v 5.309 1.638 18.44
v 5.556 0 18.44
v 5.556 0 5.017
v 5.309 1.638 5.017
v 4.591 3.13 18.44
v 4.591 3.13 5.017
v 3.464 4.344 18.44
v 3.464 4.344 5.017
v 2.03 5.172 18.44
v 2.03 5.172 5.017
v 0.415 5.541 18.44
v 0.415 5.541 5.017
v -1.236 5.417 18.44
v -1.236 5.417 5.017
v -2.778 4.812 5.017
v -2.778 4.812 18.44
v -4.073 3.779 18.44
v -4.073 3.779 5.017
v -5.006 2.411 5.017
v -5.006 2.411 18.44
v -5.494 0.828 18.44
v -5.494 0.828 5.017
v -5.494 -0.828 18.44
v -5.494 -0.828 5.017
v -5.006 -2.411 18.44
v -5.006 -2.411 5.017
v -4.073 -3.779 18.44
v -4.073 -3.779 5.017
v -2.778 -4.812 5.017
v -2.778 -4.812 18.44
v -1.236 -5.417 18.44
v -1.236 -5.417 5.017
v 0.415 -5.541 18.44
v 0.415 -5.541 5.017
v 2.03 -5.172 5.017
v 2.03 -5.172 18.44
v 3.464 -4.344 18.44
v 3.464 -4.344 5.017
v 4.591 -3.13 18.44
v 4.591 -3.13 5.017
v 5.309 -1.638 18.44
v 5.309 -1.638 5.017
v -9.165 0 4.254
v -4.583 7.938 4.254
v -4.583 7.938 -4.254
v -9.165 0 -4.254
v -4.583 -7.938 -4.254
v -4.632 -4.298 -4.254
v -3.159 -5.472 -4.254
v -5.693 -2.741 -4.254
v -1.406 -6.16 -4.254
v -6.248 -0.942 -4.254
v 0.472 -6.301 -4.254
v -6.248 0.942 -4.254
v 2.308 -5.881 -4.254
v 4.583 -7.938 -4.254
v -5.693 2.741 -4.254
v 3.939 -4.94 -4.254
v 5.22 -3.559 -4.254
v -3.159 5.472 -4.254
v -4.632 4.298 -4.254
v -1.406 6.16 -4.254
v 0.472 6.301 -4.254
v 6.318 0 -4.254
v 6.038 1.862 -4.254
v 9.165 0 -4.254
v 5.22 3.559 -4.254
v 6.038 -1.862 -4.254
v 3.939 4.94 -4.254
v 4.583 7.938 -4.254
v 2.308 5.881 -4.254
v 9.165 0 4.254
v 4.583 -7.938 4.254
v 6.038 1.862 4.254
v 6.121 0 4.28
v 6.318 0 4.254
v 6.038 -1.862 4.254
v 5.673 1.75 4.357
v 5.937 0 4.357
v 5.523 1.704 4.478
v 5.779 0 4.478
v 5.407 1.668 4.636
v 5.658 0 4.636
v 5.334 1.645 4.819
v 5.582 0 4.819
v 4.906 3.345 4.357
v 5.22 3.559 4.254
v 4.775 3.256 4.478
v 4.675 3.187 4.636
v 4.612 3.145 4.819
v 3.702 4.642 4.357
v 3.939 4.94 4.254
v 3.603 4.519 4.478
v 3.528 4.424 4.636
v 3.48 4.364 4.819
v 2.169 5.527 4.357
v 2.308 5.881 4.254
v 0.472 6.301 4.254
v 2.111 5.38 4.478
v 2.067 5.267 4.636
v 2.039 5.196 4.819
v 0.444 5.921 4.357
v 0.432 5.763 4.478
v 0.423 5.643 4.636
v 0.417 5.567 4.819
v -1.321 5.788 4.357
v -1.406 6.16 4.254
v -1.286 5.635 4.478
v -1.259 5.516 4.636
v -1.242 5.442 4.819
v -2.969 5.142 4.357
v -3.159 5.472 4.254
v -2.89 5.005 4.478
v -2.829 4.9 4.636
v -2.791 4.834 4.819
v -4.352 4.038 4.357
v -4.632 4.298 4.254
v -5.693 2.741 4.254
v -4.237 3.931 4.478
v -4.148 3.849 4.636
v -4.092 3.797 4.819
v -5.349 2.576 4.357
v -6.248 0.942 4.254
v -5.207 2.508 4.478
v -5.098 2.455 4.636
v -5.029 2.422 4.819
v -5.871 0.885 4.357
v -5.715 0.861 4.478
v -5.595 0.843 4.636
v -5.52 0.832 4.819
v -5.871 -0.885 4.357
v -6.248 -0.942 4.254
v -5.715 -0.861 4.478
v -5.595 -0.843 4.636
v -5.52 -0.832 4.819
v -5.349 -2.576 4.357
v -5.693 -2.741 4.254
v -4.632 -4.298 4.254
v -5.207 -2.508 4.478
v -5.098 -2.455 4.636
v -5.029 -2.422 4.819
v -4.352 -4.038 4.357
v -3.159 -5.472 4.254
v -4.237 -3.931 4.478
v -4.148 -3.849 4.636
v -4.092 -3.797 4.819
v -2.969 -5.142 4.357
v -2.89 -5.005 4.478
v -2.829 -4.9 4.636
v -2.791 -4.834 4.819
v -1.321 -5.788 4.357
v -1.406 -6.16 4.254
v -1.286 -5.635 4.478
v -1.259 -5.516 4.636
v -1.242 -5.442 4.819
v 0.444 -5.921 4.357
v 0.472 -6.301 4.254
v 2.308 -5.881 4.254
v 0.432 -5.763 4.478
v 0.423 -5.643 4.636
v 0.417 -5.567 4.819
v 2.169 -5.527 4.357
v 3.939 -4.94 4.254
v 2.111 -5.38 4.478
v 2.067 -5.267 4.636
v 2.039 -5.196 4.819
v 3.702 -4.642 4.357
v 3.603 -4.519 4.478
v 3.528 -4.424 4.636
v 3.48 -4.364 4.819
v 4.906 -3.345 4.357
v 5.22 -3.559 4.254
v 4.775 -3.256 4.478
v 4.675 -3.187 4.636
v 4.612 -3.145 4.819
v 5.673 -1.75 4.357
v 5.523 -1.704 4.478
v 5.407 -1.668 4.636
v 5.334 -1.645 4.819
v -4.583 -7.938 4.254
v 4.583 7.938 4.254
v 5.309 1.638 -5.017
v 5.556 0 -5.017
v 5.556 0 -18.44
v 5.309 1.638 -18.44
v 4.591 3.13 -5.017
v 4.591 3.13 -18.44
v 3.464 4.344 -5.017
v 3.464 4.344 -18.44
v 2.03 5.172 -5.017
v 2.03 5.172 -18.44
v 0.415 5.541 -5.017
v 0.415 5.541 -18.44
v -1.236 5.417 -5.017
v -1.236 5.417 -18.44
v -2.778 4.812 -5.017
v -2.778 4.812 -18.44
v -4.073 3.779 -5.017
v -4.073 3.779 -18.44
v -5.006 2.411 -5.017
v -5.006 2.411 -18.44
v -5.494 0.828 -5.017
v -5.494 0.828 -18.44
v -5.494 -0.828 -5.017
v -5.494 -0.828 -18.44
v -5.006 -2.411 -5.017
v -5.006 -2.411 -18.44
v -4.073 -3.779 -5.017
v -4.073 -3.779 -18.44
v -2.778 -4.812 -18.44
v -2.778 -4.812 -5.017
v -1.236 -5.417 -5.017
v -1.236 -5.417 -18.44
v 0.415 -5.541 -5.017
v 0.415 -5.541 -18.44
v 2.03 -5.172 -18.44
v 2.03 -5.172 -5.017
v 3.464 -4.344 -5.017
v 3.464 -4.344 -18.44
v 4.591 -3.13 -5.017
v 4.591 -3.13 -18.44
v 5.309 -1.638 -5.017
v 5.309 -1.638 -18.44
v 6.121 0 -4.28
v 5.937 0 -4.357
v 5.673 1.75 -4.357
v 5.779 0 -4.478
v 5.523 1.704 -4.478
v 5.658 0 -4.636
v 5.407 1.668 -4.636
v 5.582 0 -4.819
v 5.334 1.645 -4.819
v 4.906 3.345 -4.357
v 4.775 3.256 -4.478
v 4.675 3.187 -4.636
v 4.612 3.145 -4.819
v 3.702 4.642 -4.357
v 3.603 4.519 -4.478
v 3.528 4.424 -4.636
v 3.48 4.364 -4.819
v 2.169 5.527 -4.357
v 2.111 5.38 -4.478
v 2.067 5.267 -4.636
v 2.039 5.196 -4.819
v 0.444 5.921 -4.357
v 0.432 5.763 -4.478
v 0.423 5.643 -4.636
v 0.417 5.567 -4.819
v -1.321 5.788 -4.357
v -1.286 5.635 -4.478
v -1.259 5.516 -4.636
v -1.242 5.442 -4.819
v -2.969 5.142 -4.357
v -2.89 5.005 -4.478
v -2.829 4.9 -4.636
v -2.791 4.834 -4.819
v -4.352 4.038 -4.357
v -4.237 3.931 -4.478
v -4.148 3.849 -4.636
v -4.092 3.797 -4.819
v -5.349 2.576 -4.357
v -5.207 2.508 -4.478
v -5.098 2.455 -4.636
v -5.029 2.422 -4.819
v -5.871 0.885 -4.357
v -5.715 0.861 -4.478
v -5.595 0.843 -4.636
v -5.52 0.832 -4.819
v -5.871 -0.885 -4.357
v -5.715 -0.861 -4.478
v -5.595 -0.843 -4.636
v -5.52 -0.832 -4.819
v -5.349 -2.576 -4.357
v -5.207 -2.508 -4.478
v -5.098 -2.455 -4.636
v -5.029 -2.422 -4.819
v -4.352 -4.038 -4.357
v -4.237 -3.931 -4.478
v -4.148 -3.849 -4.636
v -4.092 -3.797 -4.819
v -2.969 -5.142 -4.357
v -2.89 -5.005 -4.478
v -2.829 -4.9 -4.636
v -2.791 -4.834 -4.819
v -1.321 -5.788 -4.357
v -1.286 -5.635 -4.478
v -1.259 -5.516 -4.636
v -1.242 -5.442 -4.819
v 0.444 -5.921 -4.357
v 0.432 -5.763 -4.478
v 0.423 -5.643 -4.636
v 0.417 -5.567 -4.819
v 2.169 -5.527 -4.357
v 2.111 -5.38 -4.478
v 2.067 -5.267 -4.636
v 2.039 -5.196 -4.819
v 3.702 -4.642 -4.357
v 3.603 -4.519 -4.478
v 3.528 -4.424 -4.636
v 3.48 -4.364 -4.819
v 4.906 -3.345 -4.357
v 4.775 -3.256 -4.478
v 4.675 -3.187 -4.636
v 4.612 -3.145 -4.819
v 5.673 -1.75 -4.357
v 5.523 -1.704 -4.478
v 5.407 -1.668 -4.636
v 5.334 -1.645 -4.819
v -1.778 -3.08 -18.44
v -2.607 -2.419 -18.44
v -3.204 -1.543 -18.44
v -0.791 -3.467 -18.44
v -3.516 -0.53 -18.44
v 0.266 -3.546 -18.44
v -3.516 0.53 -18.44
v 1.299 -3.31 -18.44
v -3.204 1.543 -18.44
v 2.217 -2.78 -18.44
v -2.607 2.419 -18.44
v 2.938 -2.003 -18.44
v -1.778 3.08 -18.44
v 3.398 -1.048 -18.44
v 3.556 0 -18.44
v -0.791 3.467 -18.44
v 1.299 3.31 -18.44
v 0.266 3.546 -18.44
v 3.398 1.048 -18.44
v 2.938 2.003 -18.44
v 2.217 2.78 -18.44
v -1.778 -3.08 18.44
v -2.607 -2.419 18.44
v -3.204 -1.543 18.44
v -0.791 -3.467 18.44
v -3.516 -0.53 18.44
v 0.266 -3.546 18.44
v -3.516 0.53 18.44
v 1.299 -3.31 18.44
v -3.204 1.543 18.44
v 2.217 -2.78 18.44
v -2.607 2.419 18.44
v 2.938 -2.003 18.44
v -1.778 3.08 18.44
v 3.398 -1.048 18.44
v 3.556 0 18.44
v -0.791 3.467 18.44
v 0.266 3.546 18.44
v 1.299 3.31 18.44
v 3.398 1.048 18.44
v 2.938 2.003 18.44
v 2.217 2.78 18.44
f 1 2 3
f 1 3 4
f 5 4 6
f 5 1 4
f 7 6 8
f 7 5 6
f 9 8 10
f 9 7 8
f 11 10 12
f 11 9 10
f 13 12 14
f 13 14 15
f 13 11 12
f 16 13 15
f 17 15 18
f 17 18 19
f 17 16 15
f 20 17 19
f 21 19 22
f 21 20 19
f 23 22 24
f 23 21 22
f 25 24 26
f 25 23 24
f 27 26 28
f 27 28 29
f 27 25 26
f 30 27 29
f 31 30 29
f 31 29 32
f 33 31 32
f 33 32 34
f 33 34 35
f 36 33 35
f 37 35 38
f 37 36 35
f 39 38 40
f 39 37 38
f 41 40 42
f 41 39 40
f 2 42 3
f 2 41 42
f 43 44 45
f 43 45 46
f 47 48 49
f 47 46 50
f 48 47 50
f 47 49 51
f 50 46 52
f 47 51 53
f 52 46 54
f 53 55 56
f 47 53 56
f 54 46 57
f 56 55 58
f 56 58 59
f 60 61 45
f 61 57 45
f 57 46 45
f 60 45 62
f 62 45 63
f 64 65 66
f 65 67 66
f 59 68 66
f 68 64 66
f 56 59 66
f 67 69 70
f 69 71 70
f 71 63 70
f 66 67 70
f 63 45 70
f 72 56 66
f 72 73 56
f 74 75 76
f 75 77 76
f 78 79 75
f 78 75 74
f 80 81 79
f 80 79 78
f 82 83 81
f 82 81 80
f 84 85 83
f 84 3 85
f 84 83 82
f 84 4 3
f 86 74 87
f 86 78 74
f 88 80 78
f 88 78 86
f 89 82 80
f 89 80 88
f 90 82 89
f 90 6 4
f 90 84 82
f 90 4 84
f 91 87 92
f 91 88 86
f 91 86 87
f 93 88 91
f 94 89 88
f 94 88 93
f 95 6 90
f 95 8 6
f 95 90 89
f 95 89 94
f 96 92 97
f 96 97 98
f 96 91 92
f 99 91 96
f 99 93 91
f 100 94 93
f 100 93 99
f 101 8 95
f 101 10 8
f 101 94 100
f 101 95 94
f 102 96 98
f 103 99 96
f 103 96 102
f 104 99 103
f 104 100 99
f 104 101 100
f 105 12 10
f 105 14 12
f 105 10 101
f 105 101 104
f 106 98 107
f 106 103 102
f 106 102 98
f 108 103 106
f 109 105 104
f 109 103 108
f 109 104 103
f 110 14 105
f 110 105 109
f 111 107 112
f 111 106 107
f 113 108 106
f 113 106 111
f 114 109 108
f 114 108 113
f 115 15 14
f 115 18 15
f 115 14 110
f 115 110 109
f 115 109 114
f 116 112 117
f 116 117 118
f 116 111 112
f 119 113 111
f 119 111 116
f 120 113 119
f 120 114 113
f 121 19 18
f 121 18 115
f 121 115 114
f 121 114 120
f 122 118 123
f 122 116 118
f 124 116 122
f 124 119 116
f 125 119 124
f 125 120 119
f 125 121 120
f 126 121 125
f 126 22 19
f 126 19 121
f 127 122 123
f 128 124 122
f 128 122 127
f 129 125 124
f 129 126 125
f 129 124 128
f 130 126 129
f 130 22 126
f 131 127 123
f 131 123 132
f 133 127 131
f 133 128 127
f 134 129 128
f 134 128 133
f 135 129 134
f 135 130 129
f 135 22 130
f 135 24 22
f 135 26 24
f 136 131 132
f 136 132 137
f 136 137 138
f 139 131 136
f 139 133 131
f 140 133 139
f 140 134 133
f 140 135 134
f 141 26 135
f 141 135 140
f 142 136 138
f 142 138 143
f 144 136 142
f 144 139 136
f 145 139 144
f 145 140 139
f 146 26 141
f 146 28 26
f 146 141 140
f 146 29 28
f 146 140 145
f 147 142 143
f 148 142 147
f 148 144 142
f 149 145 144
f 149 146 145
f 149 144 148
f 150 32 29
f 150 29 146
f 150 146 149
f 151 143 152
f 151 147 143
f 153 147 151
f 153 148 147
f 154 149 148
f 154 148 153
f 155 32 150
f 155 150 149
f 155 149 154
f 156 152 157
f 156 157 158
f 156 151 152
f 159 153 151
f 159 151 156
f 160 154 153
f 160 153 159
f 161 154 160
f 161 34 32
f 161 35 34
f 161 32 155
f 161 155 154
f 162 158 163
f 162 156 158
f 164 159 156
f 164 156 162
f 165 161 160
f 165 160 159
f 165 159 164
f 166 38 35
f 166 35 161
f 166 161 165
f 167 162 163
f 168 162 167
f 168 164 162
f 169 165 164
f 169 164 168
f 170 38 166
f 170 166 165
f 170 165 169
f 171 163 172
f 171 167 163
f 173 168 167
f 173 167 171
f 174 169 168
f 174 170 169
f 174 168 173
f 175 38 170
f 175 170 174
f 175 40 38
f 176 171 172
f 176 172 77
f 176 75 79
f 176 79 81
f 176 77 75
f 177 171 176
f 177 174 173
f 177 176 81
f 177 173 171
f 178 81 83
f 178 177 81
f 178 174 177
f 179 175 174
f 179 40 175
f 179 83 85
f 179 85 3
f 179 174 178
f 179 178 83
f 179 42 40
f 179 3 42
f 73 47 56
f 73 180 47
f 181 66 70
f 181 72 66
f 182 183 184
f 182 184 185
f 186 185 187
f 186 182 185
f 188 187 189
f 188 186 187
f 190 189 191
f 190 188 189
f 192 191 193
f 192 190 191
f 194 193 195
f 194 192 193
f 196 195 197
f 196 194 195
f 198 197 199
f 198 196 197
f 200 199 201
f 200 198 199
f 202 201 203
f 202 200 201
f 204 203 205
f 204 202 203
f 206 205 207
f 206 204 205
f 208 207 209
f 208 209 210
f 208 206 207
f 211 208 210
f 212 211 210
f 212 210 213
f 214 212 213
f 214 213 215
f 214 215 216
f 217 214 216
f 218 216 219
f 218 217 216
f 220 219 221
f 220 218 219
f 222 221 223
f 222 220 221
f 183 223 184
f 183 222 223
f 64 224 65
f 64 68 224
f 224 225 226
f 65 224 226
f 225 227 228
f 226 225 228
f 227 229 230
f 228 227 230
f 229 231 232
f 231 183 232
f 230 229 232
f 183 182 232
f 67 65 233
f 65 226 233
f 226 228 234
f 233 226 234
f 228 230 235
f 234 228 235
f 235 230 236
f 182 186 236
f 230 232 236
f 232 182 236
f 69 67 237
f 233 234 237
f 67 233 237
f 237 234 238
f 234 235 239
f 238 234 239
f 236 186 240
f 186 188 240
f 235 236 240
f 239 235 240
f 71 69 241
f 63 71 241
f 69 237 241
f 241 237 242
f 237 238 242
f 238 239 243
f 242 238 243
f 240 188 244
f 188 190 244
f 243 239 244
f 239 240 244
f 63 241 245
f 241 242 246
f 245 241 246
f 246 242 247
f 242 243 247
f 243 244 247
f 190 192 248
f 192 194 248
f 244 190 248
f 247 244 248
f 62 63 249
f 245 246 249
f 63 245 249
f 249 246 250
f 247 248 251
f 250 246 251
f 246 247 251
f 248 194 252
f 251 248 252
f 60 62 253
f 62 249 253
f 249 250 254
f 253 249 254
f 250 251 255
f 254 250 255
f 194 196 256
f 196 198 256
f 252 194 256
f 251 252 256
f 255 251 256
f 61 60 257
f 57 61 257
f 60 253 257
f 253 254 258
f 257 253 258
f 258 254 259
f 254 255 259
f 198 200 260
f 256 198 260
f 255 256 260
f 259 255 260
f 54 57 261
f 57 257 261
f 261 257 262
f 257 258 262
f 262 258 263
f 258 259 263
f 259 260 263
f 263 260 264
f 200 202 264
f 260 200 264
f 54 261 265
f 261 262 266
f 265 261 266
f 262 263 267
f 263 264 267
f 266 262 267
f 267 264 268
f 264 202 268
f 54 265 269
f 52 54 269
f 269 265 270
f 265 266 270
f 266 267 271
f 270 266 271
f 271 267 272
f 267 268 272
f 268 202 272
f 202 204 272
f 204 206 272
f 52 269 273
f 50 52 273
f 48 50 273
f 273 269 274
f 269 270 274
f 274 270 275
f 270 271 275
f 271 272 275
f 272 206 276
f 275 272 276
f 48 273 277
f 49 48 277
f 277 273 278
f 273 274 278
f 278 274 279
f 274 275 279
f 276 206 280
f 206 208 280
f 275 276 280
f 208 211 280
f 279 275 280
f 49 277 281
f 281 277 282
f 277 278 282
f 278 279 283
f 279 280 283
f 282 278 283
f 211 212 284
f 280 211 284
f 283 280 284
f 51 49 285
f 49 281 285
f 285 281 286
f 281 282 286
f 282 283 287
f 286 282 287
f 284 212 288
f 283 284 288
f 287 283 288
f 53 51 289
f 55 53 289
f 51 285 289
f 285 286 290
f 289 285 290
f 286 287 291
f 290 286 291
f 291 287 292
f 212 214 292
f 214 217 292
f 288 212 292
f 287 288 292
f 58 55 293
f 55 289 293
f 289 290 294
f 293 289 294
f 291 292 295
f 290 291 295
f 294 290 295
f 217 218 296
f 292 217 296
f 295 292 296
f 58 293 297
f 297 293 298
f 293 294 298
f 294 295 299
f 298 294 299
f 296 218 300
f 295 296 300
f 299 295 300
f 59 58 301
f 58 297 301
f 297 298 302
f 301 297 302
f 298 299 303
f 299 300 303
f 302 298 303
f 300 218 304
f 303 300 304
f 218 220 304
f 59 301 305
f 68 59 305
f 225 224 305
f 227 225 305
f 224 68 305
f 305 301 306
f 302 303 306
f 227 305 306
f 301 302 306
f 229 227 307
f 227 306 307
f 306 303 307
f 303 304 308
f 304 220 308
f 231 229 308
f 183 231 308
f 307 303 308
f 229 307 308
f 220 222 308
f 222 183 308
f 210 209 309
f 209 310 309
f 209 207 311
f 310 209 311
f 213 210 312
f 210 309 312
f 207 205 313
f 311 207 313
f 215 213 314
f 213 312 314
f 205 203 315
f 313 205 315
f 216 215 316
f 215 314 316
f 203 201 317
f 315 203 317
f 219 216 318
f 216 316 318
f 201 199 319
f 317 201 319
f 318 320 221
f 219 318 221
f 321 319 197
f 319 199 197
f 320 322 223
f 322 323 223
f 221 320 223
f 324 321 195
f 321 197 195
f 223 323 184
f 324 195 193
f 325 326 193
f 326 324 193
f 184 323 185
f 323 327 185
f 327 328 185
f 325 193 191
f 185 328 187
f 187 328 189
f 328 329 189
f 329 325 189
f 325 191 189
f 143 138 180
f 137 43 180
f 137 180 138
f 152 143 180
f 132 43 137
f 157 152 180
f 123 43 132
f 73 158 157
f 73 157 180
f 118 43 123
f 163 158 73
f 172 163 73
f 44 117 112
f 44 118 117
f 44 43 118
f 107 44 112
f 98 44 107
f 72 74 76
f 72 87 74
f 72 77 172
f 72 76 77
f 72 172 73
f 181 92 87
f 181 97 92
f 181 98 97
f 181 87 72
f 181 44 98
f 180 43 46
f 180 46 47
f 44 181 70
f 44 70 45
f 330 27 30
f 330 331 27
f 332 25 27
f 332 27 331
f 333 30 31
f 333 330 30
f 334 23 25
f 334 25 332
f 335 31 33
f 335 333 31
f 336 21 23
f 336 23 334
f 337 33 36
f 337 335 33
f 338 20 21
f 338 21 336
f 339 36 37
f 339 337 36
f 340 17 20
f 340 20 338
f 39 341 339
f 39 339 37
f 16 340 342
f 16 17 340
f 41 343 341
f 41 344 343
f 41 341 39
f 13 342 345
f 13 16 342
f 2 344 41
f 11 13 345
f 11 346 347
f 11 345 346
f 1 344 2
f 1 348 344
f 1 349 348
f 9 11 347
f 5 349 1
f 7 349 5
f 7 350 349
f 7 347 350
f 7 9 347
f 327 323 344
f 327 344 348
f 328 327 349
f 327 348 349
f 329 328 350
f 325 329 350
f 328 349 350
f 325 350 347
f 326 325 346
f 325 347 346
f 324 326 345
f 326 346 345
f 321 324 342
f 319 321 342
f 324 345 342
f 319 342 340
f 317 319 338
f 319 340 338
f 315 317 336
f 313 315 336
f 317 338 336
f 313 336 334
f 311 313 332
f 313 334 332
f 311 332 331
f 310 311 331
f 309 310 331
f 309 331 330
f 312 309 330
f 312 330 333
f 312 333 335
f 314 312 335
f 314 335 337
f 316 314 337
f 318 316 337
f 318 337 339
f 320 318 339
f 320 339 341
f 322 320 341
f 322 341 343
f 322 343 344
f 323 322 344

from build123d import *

# Parameters (mm, degrees)
SKETCH1_R           = 5.55625
BOSS_EXTRUDE1_DEPTH = 18.4404
BOSS_EXTRUDE2_DEPTH = 4.2545
SKETCH2_R           = 3.556
CUT_EXTRUDE1_DEPTH  = 39.822706284
FILLET1_R           = 0.762


with BuildPart() as part:
    # Sketch1 → Boss-Extrude1 (new, symmetric)
    with BuildSketch(Plane.XY):
        Circle(SKETCH1_R)
    extrude(amount=BOSS_EXTRUDE1_DEPTH, both=True)

    # Sketch3 → Boss-Extrude2 (add, symmetric)
    with BuildSketch(Plane.XY):
        Polygon((9.165435523, 0), (4.582717762, 7.9375), (-4.582717762, 7.9375), (-9.165435523, 0), (-4.582717762, -7.9375), (4.582717762, -7.9375), align=None)
    extrude(amount=BOSS_EXTRUDE2_DEPTH, both=True)

    # Sketch2 → Cut-Extrude1 (cut, through all)
    with BuildSketch(Plane.XY.offset(18.4404)):
        Circle(SKETCH2_R)
    extrude(amount=-CUT_EXTRUDE1_DEPTH, mode=Mode.SUBTRACT)

    # Fillet1
    fillet1_edges = [part.edges().sort_by_distance(p)[0] for p in [
        (-5.55625, 0, -4.2545),
        (-5.55625, 0, 4.2545),
    ]]
    fillet(fillet1_edges, radius=FILLET1_R)


solid = part.part
